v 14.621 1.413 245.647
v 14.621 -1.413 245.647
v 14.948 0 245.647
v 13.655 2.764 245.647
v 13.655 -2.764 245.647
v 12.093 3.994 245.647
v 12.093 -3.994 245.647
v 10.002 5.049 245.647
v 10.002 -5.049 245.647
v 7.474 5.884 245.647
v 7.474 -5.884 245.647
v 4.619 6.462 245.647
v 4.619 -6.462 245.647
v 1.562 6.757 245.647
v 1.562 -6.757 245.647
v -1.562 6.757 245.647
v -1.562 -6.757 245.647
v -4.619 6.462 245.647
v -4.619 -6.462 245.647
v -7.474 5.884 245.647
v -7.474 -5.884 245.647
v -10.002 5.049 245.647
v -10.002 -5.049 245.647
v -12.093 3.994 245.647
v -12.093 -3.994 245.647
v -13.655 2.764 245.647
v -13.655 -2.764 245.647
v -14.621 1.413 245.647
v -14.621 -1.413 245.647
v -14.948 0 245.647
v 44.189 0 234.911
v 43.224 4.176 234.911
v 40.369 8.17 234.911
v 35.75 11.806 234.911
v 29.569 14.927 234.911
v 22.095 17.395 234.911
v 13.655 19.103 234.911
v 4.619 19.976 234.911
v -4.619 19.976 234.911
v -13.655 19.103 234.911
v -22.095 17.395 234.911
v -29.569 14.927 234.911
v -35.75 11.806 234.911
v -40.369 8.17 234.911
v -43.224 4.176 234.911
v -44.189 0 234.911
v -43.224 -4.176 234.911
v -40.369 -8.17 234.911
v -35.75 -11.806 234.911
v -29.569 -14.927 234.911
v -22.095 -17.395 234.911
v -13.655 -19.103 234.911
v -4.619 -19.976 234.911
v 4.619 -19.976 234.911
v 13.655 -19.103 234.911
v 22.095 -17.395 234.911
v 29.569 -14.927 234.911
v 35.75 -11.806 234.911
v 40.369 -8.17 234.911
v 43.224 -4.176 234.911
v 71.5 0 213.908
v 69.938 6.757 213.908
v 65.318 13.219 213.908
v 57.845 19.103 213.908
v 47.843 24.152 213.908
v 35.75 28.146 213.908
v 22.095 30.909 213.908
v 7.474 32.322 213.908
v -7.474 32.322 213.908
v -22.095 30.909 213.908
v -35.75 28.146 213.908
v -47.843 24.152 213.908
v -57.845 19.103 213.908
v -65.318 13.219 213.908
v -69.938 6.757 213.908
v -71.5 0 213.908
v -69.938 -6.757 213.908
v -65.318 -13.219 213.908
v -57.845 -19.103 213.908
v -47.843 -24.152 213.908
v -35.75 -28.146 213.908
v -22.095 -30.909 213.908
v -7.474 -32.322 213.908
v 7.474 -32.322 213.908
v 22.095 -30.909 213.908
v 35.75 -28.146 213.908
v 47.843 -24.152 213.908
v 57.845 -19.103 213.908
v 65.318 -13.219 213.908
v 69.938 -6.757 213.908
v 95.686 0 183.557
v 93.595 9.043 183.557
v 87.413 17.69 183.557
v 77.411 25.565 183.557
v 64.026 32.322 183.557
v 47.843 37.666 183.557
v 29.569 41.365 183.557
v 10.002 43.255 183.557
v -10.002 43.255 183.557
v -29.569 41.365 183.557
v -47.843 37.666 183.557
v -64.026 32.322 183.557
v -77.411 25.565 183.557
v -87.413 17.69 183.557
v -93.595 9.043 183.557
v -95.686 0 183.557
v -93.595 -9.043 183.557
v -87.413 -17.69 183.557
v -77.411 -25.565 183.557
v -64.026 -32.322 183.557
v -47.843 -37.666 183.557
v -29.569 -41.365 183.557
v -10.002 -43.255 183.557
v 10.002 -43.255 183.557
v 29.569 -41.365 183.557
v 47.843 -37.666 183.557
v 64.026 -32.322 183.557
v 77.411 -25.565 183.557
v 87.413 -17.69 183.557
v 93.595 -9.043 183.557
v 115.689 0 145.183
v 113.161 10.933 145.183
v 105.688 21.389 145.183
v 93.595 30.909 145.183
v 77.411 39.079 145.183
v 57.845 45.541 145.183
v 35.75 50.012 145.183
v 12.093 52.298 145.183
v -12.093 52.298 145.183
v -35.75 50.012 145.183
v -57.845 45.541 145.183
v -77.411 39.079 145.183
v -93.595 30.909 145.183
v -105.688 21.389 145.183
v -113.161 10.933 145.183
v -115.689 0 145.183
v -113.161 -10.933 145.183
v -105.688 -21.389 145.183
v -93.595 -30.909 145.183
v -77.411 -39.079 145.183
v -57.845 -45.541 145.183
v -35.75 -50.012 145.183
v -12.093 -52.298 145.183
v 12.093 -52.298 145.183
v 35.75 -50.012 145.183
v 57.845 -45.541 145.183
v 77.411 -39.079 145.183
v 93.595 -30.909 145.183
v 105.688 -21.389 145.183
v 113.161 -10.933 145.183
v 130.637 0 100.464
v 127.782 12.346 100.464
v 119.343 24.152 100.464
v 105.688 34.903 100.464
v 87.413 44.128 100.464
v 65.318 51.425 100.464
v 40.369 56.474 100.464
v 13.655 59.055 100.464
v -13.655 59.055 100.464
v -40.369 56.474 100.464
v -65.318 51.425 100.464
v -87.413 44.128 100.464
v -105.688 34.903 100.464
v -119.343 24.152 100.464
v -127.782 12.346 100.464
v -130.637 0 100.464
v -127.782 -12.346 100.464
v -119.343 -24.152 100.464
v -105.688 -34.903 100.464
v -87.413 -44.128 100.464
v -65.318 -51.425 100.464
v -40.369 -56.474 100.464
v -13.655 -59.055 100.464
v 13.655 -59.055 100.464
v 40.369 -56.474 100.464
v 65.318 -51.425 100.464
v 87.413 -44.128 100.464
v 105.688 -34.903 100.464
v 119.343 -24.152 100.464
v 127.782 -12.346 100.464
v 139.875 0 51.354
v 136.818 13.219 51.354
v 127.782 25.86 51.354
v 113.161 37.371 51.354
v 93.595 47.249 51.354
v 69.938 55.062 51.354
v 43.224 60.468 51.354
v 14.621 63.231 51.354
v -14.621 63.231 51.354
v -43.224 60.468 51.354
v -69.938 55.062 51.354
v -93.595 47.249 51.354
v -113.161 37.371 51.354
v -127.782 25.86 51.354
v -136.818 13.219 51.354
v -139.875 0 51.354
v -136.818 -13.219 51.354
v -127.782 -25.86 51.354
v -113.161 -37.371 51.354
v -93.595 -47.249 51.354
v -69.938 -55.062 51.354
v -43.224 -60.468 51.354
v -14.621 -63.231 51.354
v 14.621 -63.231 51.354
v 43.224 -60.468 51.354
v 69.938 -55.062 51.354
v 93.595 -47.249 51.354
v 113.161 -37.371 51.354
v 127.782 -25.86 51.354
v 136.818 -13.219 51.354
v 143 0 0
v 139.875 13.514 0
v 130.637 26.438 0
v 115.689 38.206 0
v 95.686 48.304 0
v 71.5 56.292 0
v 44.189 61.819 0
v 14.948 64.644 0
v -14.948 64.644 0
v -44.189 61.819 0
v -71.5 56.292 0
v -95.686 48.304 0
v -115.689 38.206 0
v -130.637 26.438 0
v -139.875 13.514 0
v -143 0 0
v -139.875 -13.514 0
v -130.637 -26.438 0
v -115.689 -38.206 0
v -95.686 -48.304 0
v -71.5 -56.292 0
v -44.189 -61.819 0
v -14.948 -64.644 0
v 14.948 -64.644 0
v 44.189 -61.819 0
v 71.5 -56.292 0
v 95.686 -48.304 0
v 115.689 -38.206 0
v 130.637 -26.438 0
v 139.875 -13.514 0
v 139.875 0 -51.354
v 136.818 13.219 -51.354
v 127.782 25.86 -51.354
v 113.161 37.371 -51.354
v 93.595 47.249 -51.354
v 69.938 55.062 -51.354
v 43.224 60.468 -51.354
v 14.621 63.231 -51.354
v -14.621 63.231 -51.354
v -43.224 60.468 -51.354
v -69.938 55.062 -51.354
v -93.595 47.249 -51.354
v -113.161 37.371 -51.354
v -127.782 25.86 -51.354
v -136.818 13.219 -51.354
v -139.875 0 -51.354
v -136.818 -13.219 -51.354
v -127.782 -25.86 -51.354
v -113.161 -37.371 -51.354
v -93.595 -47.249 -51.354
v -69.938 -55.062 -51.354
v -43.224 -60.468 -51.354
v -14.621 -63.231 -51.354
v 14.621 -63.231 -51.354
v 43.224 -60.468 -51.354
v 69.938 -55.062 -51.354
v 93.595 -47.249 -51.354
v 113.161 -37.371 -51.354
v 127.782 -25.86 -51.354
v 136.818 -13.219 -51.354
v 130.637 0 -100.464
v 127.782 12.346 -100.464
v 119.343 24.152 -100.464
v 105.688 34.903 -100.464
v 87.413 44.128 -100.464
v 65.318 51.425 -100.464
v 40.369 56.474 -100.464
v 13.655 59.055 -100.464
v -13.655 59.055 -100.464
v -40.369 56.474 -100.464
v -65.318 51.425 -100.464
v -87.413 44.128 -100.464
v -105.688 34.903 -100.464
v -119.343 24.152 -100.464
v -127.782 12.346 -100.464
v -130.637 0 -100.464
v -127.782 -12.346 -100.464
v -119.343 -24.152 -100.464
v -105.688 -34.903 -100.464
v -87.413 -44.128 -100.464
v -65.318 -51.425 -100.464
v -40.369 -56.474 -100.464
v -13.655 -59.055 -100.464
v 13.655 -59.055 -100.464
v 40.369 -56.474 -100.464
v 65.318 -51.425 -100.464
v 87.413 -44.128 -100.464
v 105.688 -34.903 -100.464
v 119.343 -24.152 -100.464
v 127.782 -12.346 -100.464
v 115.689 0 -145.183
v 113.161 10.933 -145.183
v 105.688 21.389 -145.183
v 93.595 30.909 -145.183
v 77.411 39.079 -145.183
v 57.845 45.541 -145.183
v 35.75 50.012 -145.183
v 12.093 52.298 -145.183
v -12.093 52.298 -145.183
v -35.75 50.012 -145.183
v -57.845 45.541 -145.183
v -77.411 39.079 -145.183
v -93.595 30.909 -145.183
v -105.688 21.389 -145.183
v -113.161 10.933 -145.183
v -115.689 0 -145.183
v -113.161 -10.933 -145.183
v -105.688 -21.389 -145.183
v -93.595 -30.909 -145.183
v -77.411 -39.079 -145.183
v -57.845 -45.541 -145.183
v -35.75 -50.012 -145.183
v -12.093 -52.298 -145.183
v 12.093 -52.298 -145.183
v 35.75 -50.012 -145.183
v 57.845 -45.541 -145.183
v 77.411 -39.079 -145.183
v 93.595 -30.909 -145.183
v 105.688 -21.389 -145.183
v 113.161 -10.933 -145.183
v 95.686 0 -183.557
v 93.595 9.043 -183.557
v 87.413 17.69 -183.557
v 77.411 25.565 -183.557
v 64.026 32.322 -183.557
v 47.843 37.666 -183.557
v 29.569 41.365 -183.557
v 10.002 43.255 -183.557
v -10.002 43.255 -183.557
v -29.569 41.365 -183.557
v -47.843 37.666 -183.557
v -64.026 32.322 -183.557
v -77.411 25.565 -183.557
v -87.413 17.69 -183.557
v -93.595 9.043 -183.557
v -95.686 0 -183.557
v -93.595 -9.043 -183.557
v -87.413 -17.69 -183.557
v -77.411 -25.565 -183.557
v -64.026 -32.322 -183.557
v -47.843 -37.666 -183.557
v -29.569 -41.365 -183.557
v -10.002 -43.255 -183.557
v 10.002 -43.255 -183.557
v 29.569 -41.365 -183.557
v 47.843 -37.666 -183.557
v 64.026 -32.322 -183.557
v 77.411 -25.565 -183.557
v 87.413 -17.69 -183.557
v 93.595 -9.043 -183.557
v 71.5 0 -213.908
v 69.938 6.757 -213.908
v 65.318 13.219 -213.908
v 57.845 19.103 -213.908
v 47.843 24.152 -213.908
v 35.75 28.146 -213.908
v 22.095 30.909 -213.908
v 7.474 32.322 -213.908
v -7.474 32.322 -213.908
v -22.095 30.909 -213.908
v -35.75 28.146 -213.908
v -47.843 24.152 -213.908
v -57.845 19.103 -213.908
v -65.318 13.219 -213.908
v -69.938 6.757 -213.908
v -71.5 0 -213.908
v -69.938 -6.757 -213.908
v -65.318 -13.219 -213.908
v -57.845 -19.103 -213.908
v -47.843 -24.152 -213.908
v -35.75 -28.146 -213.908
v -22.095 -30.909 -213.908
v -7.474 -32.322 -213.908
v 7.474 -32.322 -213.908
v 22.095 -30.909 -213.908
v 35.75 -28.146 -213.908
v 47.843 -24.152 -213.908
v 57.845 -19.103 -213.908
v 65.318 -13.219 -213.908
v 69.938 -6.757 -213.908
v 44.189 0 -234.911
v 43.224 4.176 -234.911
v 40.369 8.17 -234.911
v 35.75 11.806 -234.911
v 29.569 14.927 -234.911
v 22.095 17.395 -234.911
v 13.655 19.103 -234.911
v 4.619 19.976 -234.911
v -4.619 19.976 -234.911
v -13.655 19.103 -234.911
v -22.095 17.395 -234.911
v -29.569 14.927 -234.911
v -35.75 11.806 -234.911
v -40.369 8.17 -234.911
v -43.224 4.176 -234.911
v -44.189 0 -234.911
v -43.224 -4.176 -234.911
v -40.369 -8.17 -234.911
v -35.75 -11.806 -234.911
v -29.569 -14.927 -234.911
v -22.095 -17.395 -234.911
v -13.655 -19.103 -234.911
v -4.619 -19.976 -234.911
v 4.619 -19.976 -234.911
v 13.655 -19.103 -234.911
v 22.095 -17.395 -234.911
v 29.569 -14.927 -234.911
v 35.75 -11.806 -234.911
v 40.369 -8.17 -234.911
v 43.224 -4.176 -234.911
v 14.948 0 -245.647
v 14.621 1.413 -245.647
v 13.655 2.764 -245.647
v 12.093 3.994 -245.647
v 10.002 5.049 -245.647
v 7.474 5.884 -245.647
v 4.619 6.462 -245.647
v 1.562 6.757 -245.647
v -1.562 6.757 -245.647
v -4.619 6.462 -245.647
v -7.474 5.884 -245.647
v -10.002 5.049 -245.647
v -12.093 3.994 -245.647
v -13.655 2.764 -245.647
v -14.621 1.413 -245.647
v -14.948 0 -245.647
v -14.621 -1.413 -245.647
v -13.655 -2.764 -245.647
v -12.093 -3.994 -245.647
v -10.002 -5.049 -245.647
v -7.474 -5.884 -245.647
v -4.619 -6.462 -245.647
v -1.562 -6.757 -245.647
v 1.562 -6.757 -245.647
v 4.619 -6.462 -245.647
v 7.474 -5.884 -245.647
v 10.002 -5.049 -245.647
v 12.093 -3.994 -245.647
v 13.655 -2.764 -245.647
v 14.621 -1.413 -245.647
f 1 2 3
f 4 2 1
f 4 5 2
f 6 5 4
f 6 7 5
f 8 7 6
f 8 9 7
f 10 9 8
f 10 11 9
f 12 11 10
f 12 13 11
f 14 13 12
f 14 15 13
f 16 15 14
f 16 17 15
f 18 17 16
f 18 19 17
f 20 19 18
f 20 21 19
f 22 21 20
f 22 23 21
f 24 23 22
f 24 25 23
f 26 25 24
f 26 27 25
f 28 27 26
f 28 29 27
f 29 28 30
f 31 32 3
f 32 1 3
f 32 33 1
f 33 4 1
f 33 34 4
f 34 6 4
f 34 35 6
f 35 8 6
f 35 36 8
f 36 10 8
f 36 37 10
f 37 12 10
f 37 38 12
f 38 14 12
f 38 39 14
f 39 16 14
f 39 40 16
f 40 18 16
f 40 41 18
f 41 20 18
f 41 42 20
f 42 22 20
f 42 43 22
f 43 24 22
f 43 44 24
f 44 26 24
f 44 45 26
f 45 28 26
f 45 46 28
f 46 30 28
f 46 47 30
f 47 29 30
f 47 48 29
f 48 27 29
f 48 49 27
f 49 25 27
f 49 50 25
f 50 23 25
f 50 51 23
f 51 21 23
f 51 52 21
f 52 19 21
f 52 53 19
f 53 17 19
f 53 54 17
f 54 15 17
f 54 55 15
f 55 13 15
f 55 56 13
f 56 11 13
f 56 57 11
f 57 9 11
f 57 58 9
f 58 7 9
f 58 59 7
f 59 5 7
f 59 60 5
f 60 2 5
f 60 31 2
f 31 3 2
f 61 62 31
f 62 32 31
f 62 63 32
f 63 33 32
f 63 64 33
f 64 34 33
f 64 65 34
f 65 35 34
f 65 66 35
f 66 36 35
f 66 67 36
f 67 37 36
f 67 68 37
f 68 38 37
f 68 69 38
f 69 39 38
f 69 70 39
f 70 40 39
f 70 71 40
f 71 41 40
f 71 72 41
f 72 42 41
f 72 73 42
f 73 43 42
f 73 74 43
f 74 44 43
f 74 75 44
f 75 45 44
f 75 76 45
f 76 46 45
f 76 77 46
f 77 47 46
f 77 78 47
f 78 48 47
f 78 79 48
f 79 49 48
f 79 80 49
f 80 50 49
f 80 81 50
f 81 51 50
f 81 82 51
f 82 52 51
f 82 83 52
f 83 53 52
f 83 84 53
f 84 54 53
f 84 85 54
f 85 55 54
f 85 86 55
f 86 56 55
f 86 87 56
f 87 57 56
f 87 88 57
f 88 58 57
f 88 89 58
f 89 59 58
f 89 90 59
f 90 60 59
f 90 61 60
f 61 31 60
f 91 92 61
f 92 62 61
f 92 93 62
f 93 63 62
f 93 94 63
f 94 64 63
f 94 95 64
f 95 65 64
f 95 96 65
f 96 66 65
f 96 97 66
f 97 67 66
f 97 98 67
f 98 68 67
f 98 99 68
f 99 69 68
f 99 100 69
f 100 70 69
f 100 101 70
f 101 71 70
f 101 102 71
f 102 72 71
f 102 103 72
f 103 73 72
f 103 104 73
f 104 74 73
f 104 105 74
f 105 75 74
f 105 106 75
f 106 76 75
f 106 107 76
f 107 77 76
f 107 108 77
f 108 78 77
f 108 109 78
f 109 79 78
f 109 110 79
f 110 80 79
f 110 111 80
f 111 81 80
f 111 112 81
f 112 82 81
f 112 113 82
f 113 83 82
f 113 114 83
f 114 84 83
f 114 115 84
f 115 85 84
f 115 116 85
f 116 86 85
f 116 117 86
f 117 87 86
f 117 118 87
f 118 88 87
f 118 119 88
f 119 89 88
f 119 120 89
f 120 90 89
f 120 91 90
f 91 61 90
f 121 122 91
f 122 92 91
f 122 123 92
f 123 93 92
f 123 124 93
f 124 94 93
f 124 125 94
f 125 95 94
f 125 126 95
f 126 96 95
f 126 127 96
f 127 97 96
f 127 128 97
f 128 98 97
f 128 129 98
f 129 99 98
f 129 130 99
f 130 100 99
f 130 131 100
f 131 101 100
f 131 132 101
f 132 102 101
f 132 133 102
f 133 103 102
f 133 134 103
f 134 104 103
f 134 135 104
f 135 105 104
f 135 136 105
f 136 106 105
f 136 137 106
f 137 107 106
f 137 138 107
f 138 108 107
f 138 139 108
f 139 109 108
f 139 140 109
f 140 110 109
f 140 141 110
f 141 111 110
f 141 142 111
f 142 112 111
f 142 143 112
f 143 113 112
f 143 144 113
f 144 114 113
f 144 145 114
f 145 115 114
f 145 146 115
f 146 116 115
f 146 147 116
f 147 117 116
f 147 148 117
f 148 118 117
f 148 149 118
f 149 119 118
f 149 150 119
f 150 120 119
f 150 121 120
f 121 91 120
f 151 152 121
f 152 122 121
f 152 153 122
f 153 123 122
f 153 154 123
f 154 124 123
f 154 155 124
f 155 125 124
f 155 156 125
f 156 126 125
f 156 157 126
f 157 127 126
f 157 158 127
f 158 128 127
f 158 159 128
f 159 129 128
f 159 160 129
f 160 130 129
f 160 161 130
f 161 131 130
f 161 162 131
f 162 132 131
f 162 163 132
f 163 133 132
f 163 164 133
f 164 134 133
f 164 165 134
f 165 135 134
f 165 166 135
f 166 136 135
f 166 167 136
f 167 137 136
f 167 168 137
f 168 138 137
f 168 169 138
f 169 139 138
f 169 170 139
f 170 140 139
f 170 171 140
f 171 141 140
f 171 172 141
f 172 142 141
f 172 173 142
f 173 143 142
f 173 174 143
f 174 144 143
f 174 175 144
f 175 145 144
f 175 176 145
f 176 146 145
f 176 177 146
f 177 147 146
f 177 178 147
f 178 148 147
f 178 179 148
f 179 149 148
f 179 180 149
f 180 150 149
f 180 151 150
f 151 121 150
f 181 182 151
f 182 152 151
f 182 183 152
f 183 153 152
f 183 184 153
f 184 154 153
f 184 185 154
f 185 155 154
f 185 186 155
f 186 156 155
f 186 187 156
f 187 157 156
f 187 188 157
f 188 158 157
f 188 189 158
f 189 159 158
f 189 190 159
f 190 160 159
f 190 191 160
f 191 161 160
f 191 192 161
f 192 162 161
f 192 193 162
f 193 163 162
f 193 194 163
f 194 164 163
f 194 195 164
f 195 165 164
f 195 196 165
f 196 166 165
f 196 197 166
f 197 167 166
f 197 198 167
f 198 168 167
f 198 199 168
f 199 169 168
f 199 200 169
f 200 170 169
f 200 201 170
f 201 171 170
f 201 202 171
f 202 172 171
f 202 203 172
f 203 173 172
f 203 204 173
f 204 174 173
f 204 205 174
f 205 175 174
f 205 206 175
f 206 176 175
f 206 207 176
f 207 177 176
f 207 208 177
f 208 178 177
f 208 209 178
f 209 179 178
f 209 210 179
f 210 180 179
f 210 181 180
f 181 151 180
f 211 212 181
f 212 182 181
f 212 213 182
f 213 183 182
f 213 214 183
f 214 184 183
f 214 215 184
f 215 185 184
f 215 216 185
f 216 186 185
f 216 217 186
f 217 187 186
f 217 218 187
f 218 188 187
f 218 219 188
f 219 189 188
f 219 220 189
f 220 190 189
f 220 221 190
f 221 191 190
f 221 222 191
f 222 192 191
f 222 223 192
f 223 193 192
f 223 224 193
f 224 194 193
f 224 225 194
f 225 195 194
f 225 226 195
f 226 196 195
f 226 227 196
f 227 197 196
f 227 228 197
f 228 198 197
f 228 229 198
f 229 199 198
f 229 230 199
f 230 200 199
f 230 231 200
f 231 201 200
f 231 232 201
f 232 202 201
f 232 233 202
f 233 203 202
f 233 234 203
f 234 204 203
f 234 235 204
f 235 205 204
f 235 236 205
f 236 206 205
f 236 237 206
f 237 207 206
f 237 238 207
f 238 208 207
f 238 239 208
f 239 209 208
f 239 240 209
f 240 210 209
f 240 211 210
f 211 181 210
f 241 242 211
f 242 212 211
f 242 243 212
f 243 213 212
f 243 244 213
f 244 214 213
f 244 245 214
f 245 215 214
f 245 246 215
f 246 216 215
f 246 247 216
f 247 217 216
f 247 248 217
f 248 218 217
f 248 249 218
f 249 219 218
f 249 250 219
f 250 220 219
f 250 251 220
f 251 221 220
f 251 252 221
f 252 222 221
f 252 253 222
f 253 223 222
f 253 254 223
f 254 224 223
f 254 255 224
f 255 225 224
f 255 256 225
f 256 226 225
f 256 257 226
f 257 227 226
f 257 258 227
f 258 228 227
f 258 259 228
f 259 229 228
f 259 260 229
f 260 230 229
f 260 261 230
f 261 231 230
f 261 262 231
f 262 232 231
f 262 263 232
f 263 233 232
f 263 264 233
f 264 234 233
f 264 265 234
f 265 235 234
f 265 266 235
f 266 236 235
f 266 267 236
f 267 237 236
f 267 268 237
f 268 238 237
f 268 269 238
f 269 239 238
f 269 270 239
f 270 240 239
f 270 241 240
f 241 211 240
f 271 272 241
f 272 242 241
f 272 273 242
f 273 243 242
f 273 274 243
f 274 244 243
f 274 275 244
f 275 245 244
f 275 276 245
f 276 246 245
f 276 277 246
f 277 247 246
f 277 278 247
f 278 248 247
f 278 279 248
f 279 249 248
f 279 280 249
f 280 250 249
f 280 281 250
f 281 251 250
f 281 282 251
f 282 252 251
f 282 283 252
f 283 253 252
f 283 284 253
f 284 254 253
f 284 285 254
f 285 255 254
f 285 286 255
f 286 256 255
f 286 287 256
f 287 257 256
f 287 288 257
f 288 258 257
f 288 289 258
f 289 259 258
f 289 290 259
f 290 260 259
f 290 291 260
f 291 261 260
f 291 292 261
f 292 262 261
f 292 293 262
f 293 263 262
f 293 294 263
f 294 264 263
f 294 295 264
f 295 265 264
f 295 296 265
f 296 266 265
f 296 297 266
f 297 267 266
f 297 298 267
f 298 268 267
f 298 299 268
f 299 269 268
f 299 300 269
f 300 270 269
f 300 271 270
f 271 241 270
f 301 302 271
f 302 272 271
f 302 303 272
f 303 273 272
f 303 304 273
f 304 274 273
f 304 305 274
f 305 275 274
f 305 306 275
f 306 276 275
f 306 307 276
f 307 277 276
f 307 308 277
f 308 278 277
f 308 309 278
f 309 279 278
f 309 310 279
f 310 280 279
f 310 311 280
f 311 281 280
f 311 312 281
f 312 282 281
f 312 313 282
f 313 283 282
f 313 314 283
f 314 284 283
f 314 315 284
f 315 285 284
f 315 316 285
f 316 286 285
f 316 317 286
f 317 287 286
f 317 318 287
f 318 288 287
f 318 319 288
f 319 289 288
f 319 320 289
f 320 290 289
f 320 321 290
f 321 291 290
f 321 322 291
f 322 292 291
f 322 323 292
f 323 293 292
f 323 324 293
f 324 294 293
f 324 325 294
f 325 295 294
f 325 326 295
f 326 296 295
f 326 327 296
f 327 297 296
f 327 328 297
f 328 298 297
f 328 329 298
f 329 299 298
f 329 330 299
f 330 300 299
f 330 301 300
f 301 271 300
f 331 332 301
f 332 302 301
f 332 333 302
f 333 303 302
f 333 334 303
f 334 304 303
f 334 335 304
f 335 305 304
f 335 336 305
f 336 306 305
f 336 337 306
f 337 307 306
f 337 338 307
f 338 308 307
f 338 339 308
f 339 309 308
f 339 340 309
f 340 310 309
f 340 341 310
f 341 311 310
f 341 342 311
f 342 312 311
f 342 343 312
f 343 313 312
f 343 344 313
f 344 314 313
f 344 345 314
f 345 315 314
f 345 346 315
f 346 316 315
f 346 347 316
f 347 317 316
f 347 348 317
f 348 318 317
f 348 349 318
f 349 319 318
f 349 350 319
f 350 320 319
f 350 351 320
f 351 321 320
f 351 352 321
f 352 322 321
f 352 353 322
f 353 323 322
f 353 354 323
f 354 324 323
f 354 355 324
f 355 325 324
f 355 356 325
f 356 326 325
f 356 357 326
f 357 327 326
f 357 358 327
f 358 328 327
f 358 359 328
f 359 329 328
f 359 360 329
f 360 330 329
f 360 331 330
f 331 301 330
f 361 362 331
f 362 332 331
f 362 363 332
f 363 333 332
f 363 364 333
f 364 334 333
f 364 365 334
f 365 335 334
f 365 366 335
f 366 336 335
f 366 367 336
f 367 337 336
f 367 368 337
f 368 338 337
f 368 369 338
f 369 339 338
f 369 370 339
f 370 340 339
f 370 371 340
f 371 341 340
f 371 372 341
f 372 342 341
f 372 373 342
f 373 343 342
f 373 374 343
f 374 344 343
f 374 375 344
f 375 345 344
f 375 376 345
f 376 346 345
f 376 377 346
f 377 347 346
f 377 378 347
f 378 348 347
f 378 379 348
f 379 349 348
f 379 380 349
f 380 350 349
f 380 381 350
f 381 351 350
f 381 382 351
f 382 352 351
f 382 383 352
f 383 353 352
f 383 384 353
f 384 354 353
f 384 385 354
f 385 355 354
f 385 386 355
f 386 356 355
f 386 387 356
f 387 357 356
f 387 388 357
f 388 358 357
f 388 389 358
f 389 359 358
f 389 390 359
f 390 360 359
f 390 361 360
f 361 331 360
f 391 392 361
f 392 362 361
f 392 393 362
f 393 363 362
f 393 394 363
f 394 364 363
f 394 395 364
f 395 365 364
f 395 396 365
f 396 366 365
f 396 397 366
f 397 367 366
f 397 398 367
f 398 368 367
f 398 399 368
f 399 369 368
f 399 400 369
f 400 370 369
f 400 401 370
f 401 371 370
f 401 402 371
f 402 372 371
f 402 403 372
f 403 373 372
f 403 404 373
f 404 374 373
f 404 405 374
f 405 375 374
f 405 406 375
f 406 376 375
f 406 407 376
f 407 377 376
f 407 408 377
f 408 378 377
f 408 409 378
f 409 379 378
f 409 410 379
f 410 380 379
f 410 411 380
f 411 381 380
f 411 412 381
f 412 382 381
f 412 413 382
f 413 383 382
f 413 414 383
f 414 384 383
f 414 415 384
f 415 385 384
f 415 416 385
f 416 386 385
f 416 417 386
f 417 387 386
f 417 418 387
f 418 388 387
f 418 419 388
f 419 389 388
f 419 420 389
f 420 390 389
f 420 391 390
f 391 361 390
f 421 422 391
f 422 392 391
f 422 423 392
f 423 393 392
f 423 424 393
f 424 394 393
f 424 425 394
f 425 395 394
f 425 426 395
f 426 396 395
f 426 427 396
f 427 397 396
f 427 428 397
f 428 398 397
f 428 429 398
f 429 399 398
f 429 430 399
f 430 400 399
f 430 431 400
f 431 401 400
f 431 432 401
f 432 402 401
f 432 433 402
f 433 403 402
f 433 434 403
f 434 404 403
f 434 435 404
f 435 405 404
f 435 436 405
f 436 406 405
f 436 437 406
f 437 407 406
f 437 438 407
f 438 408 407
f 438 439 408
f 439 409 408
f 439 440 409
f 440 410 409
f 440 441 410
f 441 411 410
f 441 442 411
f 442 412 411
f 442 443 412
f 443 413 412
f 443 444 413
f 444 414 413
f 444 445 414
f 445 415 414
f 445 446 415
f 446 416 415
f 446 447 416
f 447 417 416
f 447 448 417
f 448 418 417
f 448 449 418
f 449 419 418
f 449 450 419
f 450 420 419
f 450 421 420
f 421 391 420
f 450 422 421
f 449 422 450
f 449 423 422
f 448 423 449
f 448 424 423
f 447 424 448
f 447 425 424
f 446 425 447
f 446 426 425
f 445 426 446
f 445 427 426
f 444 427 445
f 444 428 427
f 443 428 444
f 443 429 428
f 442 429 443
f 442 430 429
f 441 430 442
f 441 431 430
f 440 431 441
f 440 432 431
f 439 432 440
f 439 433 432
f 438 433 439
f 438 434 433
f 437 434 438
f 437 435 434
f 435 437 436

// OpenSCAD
// Generated by SolidPython 1.0.1 on 2020-07-29 00:46:49


scale(v = [11, 5, 19]) {
	sphere(r = 13);
}
/***********************************************
*********      SolidPython code:      **********
************************************************
 
# import packages: SolidPython
from solid import *
from solid.utils import *
from itertools import chain, combinations, permutations


class Resize:

    def __init__(self, scad_file):
        self.scad_file = scad_file
        #self.scad_file = import_scad(scad_file)
        # cone/cylinder param:
        self.r1 = 0
        self.r2 = 0
        self.h = 0
        # rectangular prism param:
        self.w = 0
        self.l = 0
        # ellipse param:
        self.r = 0

    # import OpenScad code (file name corresponds to shape)


    # classify shape + parameters
    def assign(self, param1, param2, param3):
        if self.scad_file == 'cone.scad':
            self.r1 = param1
            self.r2 = param2
            self.h = param3
        elif self.scad_file == 'cylinder.scad':
            self.r1 = param1
            self.r2 = param2
            self.h = param3
        elif self.scad_file == 'rectangularPrism.scad':
            self.h = param1
            self.l = param2
            self.w = param3
        else:
            self.r = param1
            self.h = param2

    # resize parameters
    def iterate(self):
        x = range(3, 20, 2)
        i = 1
        if self.scad_file == 'cone.scad':
            tempList = list(permutations(x, 2))
            for temp in tempList:
                param1 = temp[0]
                param2 = temp[1]
                filepath = 'produced_scad_files/' + 'cone' + str(param1) + '_' + str(param2) + '_' + '.scad'
                scad_render_to_file(cylinder(h=param1, r1=param2, r2=0), filepath)

        elif self.scad_file == 'cylinder.scad':
            tempList = list(permutations(x, 3))
            for temp in tempList:
                param1 = temp[0]
                param2 = temp[1]
                filepath = 'produced_scad_files/' + 'cylinder' + str(param1) + '_' + str(param2) + '_' + '.scad'
                scad_render_to_file(cylinder(h=param1, r1=param2, r2=param2), filepath)

        elif self.scad_file == 'rectangularPrism.scad':
            tempList = list(permutations(x, 3))
            for temp in tempList:
                param1 = temp[0]
                param2 = temp[1]
                param3 = temp[2]
                filepath = 'produced_scad_files/' + 'rectangularPrism' + str(param1) + '_' + str(param2) + '_' + str(
                    param3) + '.scad'
                scad_render_to_file(cube(size=(param1, param2, param3)), filepath)

        elif self.scad_file == 'ellipse.scad':
            tempList = list(permutations(x, 4))
            for temp in tempList:
                param1 = temp[0]
                param2 = temp[1]
                param3 = temp[2]
                param4 = temp[3]
                filepath = 'produced_scad_files/' + 'ellipse' + str(param1) + '_' + str(param2) + '_' + str(param3) + '_' + str(param4) + '.scad'
                scad_render_to_file(scale([param1, param2, param3])(sphere(r=param4)), filepath)

    def render_to_scadfile(self):
        scad_render_to_file(scad, 'example.scad') 
 
************************************************/
